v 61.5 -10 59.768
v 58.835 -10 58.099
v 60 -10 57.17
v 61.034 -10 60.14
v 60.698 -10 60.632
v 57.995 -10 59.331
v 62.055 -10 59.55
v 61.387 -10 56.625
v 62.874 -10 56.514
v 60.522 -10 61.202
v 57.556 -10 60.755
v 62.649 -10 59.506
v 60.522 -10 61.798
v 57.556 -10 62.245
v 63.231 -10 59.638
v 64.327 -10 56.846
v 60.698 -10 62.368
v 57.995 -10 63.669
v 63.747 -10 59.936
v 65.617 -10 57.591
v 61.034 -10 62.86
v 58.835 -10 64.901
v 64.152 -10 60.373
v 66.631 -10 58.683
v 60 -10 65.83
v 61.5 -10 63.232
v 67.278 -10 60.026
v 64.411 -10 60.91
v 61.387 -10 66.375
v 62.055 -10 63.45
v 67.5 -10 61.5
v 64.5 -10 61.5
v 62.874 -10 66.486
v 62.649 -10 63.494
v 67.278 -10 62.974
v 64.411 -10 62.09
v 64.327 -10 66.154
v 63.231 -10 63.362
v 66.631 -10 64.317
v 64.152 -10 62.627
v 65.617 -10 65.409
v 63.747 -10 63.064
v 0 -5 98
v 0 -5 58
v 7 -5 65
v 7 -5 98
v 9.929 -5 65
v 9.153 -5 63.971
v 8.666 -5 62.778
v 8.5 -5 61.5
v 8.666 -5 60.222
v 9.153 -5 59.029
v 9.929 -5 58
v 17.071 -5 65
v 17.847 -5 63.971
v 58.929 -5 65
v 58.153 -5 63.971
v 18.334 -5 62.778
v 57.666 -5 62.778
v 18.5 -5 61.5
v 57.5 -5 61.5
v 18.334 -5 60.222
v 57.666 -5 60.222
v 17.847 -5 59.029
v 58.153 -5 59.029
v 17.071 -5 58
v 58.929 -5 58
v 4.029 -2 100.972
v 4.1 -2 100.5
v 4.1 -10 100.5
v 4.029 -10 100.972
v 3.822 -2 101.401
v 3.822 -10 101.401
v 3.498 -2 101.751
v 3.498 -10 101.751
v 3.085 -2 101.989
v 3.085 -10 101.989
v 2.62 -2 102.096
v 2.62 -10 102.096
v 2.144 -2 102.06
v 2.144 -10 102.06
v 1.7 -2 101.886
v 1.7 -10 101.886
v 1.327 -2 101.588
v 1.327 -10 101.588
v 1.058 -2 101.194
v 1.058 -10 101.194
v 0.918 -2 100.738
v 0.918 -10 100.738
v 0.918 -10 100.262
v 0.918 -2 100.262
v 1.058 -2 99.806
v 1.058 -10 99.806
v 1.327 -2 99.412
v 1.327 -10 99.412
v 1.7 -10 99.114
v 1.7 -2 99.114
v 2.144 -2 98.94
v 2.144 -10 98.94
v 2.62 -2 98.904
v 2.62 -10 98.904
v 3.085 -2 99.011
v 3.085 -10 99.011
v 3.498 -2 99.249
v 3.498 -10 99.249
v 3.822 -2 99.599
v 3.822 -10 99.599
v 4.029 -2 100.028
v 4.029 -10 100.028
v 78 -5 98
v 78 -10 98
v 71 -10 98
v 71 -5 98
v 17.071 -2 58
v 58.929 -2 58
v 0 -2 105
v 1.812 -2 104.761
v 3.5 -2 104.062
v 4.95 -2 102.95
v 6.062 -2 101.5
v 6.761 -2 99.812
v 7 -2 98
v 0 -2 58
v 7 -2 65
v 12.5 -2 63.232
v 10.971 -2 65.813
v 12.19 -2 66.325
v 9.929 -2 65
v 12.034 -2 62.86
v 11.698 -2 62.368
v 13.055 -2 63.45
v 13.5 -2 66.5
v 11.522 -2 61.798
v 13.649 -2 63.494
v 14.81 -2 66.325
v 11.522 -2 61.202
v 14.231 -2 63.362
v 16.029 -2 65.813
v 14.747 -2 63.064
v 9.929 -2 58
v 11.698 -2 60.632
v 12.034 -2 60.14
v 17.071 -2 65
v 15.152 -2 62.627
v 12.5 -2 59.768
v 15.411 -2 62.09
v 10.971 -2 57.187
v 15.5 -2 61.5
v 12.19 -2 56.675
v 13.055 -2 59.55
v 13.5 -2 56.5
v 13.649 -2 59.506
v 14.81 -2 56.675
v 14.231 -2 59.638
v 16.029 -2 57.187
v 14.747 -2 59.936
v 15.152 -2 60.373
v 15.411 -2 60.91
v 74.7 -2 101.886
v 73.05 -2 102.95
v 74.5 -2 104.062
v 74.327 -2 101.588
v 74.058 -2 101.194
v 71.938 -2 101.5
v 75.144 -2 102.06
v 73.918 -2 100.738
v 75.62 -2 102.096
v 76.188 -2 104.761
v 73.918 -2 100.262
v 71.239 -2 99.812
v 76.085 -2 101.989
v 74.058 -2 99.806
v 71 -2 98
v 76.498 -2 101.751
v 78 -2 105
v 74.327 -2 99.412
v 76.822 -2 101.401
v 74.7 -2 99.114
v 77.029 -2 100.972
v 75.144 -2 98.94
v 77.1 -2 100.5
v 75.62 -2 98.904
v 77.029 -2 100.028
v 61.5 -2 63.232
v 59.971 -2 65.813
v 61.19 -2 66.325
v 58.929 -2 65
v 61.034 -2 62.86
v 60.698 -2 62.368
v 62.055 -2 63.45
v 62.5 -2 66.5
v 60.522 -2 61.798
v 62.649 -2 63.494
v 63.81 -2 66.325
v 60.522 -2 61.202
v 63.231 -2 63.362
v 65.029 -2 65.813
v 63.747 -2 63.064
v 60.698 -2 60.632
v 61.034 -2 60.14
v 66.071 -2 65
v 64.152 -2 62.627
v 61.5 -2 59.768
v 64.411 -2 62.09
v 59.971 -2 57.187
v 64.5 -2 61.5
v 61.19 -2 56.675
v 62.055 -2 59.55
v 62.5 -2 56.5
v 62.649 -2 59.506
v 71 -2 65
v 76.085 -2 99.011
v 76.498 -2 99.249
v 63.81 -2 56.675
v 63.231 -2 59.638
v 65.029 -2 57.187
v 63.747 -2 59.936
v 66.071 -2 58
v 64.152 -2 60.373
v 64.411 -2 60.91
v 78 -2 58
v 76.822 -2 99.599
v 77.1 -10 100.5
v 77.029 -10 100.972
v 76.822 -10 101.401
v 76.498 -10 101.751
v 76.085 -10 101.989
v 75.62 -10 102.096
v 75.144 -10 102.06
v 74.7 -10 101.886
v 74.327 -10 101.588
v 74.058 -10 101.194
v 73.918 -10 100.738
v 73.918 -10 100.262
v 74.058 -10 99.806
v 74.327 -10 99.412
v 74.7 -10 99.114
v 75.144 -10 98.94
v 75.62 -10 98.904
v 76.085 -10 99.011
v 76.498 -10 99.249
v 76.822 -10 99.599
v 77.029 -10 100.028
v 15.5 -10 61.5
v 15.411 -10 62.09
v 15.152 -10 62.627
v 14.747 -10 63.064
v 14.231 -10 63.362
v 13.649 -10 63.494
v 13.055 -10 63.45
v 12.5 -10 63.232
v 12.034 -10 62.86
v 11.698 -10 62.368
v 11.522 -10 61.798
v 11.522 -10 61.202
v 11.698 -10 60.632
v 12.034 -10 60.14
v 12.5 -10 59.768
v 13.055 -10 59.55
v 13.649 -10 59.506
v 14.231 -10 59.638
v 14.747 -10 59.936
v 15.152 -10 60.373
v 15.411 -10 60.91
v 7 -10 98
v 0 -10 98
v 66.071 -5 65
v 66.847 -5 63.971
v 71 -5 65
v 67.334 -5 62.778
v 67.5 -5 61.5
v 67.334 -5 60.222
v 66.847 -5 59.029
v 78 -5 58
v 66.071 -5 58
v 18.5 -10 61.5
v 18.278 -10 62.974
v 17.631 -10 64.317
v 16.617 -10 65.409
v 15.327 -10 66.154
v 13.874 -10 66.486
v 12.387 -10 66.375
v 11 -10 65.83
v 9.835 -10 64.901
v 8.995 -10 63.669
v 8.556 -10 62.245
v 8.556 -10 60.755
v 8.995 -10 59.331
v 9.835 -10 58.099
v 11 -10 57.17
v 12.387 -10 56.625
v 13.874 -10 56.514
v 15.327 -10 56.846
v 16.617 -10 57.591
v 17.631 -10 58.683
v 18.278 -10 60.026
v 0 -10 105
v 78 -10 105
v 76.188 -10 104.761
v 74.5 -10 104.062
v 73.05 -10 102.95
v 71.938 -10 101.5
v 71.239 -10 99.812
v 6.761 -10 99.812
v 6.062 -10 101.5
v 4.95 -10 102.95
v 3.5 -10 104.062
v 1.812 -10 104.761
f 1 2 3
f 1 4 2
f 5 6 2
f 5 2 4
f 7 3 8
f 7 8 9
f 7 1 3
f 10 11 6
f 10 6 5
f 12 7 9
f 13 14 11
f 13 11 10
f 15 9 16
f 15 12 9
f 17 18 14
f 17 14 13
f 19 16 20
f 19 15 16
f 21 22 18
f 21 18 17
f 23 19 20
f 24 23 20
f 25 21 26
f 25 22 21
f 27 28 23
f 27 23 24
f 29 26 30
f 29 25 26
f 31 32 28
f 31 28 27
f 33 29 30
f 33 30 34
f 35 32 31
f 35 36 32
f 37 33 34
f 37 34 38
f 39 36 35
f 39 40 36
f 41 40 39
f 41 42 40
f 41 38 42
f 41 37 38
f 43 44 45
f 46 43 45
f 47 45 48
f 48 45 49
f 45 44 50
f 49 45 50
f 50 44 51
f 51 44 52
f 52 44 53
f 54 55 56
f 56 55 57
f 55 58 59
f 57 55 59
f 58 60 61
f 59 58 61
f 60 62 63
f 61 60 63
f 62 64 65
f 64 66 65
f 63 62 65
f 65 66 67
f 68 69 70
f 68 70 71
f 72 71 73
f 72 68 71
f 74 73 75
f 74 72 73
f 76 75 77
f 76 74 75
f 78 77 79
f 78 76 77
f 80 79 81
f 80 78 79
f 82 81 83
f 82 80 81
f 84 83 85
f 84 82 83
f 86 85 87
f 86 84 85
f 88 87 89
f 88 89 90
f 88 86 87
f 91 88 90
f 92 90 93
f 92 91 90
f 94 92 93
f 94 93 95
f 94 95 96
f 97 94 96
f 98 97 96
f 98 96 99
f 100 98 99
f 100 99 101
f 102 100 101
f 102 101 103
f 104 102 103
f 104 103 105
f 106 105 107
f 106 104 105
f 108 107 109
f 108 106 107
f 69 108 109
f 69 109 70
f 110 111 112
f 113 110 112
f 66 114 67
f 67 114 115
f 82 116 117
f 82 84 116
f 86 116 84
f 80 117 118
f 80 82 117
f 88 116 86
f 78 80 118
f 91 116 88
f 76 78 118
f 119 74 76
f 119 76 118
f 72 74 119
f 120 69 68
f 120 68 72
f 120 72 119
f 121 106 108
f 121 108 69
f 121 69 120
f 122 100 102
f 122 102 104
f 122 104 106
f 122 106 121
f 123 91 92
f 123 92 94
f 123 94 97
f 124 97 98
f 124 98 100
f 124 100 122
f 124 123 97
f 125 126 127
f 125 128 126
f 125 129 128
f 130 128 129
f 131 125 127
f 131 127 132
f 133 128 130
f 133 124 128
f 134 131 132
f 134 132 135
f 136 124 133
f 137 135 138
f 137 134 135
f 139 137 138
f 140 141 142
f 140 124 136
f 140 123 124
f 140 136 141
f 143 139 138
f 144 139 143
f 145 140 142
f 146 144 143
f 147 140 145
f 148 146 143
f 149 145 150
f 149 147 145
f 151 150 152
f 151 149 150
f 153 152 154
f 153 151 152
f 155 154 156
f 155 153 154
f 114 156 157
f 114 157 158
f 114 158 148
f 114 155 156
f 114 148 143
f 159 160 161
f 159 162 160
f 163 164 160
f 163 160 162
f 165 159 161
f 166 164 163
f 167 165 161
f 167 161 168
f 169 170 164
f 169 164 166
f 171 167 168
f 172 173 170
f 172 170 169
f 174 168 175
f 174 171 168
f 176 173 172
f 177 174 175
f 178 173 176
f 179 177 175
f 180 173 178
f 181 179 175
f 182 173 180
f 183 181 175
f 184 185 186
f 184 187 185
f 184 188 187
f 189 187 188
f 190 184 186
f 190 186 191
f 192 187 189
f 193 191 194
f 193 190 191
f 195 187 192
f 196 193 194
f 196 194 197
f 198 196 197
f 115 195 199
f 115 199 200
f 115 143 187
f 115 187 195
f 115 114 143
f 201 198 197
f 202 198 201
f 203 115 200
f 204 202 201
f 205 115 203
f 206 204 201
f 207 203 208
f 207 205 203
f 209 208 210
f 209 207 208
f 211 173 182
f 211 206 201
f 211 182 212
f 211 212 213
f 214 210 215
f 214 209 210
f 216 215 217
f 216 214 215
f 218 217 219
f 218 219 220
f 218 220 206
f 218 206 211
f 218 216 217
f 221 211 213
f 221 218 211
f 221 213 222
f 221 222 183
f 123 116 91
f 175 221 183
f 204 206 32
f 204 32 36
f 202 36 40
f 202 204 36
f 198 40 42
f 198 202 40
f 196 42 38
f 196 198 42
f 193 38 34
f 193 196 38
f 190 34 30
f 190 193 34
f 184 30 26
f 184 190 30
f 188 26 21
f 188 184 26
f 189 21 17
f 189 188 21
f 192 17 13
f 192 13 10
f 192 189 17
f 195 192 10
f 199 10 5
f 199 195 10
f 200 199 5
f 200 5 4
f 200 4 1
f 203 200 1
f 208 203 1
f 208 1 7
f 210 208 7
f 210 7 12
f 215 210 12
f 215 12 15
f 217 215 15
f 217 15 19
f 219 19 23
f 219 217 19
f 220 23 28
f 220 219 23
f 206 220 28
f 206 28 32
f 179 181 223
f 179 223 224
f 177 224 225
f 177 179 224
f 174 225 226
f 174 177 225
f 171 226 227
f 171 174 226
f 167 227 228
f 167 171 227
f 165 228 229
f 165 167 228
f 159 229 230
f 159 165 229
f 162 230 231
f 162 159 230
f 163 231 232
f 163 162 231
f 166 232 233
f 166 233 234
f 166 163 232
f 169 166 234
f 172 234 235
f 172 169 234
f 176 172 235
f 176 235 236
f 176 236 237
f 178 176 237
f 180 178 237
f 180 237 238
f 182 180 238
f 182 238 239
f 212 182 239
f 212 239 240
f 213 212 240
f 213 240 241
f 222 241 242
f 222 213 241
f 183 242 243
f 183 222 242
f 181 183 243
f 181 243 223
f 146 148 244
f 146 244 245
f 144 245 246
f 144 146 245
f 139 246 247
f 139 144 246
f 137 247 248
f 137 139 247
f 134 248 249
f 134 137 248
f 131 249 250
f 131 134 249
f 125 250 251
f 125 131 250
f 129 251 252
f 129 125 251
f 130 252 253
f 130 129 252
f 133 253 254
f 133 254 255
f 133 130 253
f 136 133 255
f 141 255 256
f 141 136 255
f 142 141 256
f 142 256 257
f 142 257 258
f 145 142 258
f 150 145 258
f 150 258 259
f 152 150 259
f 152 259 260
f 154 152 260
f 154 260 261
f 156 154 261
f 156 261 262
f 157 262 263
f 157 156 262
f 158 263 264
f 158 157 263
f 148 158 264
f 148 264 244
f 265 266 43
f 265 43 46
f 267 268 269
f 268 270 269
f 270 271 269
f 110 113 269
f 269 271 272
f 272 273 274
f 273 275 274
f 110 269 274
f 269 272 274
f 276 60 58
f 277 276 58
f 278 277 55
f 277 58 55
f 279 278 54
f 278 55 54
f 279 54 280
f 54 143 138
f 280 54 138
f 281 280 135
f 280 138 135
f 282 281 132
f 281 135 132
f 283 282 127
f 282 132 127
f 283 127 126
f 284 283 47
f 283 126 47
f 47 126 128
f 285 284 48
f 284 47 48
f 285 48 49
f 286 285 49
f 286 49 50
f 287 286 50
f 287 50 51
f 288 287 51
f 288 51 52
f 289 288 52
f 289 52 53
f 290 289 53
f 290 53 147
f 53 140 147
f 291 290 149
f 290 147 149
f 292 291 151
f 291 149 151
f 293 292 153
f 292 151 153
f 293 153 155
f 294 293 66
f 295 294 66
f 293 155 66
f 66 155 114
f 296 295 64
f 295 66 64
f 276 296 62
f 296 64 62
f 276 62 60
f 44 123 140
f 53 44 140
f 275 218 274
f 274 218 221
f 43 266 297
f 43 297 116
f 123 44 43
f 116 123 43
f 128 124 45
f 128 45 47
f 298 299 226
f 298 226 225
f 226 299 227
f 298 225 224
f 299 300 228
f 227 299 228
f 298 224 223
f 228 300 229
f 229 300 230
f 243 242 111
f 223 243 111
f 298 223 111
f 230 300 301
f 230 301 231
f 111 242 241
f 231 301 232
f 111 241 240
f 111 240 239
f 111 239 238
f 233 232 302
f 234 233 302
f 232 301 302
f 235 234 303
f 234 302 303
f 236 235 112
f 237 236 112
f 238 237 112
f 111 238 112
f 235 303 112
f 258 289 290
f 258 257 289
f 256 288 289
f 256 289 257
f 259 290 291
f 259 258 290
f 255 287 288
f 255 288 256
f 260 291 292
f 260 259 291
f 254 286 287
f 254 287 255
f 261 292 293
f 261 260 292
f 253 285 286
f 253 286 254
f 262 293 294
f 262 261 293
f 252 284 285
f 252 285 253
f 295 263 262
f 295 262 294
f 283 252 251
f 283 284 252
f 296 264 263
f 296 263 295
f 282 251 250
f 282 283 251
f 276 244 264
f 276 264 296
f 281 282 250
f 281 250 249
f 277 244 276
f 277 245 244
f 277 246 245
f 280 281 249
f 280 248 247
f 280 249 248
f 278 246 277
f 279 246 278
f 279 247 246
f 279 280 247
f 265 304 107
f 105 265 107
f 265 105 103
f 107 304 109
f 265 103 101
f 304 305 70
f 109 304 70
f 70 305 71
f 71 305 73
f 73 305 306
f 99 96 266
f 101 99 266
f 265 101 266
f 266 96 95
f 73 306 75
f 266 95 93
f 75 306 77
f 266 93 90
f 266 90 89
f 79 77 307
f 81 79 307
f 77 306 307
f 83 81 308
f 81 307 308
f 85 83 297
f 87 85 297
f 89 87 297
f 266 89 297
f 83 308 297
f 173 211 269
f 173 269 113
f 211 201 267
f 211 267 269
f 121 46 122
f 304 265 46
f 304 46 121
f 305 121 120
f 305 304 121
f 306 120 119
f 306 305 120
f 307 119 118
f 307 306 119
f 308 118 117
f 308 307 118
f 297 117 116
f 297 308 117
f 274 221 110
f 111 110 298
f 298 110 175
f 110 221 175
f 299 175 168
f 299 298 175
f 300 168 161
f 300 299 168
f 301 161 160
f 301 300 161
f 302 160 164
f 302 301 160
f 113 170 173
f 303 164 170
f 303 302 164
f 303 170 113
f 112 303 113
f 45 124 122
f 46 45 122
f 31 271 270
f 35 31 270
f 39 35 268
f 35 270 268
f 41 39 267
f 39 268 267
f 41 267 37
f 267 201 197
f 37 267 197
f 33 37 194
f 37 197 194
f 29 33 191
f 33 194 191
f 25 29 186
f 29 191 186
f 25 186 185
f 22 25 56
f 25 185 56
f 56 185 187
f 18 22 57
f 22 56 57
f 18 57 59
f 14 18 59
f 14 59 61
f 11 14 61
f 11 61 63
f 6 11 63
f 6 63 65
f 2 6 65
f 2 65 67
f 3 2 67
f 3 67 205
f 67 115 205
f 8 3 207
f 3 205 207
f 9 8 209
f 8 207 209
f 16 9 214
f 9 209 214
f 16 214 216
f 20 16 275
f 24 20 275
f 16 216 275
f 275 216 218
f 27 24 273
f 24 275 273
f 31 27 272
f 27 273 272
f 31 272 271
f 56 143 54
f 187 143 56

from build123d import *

# Parameters (mm, degrees)
CYLINDER032_R     = 2
CYLINDER032_DEPTH = 8
CYLINDER035_R     = 2
CYLINDER035_DEPTH = 8
CYLINDER038_R     = 1.6
CYLINDER038_DEPTH = 8
CYLINDER039_R     = 1.6
CYLINDER039_DEPTH = 8
CYLINDER037_W     = 7
CYLINDER037_H     = 8
CYLINDER037_ANGLE = 90
BOX025_W          = 78
BOX025_H          = 3
BOX025_DEPTH      = 7
BOX026_W          = 40
BOX026_H          = 3
BOX026_DEPTH      = 7
CYLINDER034_R     = 5
CYLINDER034_DEPTH = 8
CYLINDER031_R     = 5
CYLINDER031_DEPTH = 8
BOX027_W          = 40
BOX027_H          = 3
BOX027_DEPTH      = 7
CYLINDER036_W     = 7
CYLINDER036_H     = 8
CYLINDER036_ANGLE = 90


with BuildPart() as cuts:
    # Cylinder032 → Cylinder032 (new body)
    with BuildSketch(Plane(origin=(13.5, -2, 61.5), x_dir=(1, 0, 0), z_dir=(0, -1, 0))):
        Circle(CYLINDER032_R)
    extrude(amount=CYLINDER032_DEPTH)


with BuildPart() as cuts001:
    # Cylinder035 → Cylinder035 (new body)
    with BuildSketch(Plane(origin=(62.5, -2, 61.5), x_dir=(1, 0, 0), z_dir=(0, -1, 0))):
        Circle(CYLINDER035_R)
    extrude(amount=CYLINDER035_DEPTH)


with BuildPart() as m3screw:
    # Cylinder038 → Cylinder038 (new body)
    with BuildSketch(Plane(origin=(75.5, -2, 100.5), x_dir=(1, 0, 0), z_dir=(0, -1, 0))):
        Circle(CYLINDER038_R)
    extrude(amount=CYLINDER038_DEPTH)


with BuildPart() as c4oldcuts:
    # Cylinder039 → Cylinder039 (new body)
    with BuildSketch(Plane(origin=(2.5, -2, 100.5), x_dir=(1, 0, 0), z_dir=(0, -1, 0))):
        Circle(CYLINDER039_R)
    extrude(amount=CYLINDER039_DEPTH)

    # Fusion016: union cuts, cuts001, m3Screw
    add(cuts.part)
    add(cuts001.part)
    add(m3screw.part)


with BuildPart() as cylinder037:
    # Cylinder037 → Cylinder037 (revolve)
    with BuildSketch(Plane(origin=(0, -2, 98), x_dir=(1, 0, 0), z_dir=(0, 0, -1))):
        with Locations((3.5, 4)):
            Rectangle(CYLINDER037_W, CYLINDER037_H)
    revolve(axis=Axis((0, -2, 98), (0, -1, 0)), revolution_arc=CYLINDER037_ANGLE)


with BuildPart() as cube020:
    # Box025 → Box025 (new body)
    with BuildSketch(Plane(origin=(0, -5, 58), x_dir=(1, 0, 0), z_dir=(0, 0, 1))):
        with Locations((39, 1.5)):
            Rectangle(BOX025_W, BOX025_H)
    extrude(amount=BOX025_DEPTH)


with BuildPart() as cube021:
    # Box026 → Box026 (new body)
    with BuildSketch(Plane(origin=(7, -5, 58), x_dir=(0, 0, 1), z_dir=(-1, 0, 0))):
        with Locations((20, 1.5)):
            Rectangle(BOX026_W, BOX026_H)
    extrude(amount=BOX026_DEPTH)


with BuildPart() as cylinder034:
    # Cylinder034 → Cylinder034 (new body)
    with BuildSketch(Plane(origin=(62.5, -2, 61.5), x_dir=(1, 0, 0), z_dir=(0, -1, 0))):
        Circle(CYLINDER034_R)
    extrude(amount=CYLINDER034_DEPTH)


with BuildPart() as cylinder031:
    # Cylinder031 → Cylinder031 (new body)
    with BuildSketch(Plane(origin=(13.5, -2, 61.5), x_dir=(1, 0, 0), z_dir=(0, -1, 0))):
        Circle(CYLINDER031_R)
    extrude(amount=CYLINDER031_DEPTH)


with BuildPart() as fusion014:
    # Box027 → Box027 (new body)
    with BuildSketch(Plane(origin=(78, -5, 58), x_dir=(0, 0, 1), z_dir=(-1, 0, 0))):
        with Locations((20, 1.5)):
            Rectangle(BOX027_W, BOX027_H)
    extrude(amount=BOX027_DEPTH)

    # Fusion014: union Cube020, Cube021, Cylinder034, Cylinder031
    add(cube020.part)
    add(cube021.part)
    add(cylinder034.part)
    add(cylinder031.part)


with BuildPart() as c4hold001:
    # Cylinder036 → Cylinder036 (revolve)
    with BuildSketch(Plane(origin=(78, -2, 98), x_dir=(0, 0, 1), z_dir=(1, 0, 0))):
        with Locations((3.5, 4)):
            Rectangle(CYLINDER036_W, CYLINDER036_H)
    revolve(axis=Axis((78, -2, 98), (0, -1, 0)), revolution_arc=CYLINDER036_ANGLE)

    # Fusion015: union Cylinder037, Fusion014
    add(cylinder037.part)
    add(fusion014.part)

    # Cut024: cut c4oldCuts
    add(c4oldcuts.part, mode=Mode.SUBTRACT)


solid = c4hold001.part
